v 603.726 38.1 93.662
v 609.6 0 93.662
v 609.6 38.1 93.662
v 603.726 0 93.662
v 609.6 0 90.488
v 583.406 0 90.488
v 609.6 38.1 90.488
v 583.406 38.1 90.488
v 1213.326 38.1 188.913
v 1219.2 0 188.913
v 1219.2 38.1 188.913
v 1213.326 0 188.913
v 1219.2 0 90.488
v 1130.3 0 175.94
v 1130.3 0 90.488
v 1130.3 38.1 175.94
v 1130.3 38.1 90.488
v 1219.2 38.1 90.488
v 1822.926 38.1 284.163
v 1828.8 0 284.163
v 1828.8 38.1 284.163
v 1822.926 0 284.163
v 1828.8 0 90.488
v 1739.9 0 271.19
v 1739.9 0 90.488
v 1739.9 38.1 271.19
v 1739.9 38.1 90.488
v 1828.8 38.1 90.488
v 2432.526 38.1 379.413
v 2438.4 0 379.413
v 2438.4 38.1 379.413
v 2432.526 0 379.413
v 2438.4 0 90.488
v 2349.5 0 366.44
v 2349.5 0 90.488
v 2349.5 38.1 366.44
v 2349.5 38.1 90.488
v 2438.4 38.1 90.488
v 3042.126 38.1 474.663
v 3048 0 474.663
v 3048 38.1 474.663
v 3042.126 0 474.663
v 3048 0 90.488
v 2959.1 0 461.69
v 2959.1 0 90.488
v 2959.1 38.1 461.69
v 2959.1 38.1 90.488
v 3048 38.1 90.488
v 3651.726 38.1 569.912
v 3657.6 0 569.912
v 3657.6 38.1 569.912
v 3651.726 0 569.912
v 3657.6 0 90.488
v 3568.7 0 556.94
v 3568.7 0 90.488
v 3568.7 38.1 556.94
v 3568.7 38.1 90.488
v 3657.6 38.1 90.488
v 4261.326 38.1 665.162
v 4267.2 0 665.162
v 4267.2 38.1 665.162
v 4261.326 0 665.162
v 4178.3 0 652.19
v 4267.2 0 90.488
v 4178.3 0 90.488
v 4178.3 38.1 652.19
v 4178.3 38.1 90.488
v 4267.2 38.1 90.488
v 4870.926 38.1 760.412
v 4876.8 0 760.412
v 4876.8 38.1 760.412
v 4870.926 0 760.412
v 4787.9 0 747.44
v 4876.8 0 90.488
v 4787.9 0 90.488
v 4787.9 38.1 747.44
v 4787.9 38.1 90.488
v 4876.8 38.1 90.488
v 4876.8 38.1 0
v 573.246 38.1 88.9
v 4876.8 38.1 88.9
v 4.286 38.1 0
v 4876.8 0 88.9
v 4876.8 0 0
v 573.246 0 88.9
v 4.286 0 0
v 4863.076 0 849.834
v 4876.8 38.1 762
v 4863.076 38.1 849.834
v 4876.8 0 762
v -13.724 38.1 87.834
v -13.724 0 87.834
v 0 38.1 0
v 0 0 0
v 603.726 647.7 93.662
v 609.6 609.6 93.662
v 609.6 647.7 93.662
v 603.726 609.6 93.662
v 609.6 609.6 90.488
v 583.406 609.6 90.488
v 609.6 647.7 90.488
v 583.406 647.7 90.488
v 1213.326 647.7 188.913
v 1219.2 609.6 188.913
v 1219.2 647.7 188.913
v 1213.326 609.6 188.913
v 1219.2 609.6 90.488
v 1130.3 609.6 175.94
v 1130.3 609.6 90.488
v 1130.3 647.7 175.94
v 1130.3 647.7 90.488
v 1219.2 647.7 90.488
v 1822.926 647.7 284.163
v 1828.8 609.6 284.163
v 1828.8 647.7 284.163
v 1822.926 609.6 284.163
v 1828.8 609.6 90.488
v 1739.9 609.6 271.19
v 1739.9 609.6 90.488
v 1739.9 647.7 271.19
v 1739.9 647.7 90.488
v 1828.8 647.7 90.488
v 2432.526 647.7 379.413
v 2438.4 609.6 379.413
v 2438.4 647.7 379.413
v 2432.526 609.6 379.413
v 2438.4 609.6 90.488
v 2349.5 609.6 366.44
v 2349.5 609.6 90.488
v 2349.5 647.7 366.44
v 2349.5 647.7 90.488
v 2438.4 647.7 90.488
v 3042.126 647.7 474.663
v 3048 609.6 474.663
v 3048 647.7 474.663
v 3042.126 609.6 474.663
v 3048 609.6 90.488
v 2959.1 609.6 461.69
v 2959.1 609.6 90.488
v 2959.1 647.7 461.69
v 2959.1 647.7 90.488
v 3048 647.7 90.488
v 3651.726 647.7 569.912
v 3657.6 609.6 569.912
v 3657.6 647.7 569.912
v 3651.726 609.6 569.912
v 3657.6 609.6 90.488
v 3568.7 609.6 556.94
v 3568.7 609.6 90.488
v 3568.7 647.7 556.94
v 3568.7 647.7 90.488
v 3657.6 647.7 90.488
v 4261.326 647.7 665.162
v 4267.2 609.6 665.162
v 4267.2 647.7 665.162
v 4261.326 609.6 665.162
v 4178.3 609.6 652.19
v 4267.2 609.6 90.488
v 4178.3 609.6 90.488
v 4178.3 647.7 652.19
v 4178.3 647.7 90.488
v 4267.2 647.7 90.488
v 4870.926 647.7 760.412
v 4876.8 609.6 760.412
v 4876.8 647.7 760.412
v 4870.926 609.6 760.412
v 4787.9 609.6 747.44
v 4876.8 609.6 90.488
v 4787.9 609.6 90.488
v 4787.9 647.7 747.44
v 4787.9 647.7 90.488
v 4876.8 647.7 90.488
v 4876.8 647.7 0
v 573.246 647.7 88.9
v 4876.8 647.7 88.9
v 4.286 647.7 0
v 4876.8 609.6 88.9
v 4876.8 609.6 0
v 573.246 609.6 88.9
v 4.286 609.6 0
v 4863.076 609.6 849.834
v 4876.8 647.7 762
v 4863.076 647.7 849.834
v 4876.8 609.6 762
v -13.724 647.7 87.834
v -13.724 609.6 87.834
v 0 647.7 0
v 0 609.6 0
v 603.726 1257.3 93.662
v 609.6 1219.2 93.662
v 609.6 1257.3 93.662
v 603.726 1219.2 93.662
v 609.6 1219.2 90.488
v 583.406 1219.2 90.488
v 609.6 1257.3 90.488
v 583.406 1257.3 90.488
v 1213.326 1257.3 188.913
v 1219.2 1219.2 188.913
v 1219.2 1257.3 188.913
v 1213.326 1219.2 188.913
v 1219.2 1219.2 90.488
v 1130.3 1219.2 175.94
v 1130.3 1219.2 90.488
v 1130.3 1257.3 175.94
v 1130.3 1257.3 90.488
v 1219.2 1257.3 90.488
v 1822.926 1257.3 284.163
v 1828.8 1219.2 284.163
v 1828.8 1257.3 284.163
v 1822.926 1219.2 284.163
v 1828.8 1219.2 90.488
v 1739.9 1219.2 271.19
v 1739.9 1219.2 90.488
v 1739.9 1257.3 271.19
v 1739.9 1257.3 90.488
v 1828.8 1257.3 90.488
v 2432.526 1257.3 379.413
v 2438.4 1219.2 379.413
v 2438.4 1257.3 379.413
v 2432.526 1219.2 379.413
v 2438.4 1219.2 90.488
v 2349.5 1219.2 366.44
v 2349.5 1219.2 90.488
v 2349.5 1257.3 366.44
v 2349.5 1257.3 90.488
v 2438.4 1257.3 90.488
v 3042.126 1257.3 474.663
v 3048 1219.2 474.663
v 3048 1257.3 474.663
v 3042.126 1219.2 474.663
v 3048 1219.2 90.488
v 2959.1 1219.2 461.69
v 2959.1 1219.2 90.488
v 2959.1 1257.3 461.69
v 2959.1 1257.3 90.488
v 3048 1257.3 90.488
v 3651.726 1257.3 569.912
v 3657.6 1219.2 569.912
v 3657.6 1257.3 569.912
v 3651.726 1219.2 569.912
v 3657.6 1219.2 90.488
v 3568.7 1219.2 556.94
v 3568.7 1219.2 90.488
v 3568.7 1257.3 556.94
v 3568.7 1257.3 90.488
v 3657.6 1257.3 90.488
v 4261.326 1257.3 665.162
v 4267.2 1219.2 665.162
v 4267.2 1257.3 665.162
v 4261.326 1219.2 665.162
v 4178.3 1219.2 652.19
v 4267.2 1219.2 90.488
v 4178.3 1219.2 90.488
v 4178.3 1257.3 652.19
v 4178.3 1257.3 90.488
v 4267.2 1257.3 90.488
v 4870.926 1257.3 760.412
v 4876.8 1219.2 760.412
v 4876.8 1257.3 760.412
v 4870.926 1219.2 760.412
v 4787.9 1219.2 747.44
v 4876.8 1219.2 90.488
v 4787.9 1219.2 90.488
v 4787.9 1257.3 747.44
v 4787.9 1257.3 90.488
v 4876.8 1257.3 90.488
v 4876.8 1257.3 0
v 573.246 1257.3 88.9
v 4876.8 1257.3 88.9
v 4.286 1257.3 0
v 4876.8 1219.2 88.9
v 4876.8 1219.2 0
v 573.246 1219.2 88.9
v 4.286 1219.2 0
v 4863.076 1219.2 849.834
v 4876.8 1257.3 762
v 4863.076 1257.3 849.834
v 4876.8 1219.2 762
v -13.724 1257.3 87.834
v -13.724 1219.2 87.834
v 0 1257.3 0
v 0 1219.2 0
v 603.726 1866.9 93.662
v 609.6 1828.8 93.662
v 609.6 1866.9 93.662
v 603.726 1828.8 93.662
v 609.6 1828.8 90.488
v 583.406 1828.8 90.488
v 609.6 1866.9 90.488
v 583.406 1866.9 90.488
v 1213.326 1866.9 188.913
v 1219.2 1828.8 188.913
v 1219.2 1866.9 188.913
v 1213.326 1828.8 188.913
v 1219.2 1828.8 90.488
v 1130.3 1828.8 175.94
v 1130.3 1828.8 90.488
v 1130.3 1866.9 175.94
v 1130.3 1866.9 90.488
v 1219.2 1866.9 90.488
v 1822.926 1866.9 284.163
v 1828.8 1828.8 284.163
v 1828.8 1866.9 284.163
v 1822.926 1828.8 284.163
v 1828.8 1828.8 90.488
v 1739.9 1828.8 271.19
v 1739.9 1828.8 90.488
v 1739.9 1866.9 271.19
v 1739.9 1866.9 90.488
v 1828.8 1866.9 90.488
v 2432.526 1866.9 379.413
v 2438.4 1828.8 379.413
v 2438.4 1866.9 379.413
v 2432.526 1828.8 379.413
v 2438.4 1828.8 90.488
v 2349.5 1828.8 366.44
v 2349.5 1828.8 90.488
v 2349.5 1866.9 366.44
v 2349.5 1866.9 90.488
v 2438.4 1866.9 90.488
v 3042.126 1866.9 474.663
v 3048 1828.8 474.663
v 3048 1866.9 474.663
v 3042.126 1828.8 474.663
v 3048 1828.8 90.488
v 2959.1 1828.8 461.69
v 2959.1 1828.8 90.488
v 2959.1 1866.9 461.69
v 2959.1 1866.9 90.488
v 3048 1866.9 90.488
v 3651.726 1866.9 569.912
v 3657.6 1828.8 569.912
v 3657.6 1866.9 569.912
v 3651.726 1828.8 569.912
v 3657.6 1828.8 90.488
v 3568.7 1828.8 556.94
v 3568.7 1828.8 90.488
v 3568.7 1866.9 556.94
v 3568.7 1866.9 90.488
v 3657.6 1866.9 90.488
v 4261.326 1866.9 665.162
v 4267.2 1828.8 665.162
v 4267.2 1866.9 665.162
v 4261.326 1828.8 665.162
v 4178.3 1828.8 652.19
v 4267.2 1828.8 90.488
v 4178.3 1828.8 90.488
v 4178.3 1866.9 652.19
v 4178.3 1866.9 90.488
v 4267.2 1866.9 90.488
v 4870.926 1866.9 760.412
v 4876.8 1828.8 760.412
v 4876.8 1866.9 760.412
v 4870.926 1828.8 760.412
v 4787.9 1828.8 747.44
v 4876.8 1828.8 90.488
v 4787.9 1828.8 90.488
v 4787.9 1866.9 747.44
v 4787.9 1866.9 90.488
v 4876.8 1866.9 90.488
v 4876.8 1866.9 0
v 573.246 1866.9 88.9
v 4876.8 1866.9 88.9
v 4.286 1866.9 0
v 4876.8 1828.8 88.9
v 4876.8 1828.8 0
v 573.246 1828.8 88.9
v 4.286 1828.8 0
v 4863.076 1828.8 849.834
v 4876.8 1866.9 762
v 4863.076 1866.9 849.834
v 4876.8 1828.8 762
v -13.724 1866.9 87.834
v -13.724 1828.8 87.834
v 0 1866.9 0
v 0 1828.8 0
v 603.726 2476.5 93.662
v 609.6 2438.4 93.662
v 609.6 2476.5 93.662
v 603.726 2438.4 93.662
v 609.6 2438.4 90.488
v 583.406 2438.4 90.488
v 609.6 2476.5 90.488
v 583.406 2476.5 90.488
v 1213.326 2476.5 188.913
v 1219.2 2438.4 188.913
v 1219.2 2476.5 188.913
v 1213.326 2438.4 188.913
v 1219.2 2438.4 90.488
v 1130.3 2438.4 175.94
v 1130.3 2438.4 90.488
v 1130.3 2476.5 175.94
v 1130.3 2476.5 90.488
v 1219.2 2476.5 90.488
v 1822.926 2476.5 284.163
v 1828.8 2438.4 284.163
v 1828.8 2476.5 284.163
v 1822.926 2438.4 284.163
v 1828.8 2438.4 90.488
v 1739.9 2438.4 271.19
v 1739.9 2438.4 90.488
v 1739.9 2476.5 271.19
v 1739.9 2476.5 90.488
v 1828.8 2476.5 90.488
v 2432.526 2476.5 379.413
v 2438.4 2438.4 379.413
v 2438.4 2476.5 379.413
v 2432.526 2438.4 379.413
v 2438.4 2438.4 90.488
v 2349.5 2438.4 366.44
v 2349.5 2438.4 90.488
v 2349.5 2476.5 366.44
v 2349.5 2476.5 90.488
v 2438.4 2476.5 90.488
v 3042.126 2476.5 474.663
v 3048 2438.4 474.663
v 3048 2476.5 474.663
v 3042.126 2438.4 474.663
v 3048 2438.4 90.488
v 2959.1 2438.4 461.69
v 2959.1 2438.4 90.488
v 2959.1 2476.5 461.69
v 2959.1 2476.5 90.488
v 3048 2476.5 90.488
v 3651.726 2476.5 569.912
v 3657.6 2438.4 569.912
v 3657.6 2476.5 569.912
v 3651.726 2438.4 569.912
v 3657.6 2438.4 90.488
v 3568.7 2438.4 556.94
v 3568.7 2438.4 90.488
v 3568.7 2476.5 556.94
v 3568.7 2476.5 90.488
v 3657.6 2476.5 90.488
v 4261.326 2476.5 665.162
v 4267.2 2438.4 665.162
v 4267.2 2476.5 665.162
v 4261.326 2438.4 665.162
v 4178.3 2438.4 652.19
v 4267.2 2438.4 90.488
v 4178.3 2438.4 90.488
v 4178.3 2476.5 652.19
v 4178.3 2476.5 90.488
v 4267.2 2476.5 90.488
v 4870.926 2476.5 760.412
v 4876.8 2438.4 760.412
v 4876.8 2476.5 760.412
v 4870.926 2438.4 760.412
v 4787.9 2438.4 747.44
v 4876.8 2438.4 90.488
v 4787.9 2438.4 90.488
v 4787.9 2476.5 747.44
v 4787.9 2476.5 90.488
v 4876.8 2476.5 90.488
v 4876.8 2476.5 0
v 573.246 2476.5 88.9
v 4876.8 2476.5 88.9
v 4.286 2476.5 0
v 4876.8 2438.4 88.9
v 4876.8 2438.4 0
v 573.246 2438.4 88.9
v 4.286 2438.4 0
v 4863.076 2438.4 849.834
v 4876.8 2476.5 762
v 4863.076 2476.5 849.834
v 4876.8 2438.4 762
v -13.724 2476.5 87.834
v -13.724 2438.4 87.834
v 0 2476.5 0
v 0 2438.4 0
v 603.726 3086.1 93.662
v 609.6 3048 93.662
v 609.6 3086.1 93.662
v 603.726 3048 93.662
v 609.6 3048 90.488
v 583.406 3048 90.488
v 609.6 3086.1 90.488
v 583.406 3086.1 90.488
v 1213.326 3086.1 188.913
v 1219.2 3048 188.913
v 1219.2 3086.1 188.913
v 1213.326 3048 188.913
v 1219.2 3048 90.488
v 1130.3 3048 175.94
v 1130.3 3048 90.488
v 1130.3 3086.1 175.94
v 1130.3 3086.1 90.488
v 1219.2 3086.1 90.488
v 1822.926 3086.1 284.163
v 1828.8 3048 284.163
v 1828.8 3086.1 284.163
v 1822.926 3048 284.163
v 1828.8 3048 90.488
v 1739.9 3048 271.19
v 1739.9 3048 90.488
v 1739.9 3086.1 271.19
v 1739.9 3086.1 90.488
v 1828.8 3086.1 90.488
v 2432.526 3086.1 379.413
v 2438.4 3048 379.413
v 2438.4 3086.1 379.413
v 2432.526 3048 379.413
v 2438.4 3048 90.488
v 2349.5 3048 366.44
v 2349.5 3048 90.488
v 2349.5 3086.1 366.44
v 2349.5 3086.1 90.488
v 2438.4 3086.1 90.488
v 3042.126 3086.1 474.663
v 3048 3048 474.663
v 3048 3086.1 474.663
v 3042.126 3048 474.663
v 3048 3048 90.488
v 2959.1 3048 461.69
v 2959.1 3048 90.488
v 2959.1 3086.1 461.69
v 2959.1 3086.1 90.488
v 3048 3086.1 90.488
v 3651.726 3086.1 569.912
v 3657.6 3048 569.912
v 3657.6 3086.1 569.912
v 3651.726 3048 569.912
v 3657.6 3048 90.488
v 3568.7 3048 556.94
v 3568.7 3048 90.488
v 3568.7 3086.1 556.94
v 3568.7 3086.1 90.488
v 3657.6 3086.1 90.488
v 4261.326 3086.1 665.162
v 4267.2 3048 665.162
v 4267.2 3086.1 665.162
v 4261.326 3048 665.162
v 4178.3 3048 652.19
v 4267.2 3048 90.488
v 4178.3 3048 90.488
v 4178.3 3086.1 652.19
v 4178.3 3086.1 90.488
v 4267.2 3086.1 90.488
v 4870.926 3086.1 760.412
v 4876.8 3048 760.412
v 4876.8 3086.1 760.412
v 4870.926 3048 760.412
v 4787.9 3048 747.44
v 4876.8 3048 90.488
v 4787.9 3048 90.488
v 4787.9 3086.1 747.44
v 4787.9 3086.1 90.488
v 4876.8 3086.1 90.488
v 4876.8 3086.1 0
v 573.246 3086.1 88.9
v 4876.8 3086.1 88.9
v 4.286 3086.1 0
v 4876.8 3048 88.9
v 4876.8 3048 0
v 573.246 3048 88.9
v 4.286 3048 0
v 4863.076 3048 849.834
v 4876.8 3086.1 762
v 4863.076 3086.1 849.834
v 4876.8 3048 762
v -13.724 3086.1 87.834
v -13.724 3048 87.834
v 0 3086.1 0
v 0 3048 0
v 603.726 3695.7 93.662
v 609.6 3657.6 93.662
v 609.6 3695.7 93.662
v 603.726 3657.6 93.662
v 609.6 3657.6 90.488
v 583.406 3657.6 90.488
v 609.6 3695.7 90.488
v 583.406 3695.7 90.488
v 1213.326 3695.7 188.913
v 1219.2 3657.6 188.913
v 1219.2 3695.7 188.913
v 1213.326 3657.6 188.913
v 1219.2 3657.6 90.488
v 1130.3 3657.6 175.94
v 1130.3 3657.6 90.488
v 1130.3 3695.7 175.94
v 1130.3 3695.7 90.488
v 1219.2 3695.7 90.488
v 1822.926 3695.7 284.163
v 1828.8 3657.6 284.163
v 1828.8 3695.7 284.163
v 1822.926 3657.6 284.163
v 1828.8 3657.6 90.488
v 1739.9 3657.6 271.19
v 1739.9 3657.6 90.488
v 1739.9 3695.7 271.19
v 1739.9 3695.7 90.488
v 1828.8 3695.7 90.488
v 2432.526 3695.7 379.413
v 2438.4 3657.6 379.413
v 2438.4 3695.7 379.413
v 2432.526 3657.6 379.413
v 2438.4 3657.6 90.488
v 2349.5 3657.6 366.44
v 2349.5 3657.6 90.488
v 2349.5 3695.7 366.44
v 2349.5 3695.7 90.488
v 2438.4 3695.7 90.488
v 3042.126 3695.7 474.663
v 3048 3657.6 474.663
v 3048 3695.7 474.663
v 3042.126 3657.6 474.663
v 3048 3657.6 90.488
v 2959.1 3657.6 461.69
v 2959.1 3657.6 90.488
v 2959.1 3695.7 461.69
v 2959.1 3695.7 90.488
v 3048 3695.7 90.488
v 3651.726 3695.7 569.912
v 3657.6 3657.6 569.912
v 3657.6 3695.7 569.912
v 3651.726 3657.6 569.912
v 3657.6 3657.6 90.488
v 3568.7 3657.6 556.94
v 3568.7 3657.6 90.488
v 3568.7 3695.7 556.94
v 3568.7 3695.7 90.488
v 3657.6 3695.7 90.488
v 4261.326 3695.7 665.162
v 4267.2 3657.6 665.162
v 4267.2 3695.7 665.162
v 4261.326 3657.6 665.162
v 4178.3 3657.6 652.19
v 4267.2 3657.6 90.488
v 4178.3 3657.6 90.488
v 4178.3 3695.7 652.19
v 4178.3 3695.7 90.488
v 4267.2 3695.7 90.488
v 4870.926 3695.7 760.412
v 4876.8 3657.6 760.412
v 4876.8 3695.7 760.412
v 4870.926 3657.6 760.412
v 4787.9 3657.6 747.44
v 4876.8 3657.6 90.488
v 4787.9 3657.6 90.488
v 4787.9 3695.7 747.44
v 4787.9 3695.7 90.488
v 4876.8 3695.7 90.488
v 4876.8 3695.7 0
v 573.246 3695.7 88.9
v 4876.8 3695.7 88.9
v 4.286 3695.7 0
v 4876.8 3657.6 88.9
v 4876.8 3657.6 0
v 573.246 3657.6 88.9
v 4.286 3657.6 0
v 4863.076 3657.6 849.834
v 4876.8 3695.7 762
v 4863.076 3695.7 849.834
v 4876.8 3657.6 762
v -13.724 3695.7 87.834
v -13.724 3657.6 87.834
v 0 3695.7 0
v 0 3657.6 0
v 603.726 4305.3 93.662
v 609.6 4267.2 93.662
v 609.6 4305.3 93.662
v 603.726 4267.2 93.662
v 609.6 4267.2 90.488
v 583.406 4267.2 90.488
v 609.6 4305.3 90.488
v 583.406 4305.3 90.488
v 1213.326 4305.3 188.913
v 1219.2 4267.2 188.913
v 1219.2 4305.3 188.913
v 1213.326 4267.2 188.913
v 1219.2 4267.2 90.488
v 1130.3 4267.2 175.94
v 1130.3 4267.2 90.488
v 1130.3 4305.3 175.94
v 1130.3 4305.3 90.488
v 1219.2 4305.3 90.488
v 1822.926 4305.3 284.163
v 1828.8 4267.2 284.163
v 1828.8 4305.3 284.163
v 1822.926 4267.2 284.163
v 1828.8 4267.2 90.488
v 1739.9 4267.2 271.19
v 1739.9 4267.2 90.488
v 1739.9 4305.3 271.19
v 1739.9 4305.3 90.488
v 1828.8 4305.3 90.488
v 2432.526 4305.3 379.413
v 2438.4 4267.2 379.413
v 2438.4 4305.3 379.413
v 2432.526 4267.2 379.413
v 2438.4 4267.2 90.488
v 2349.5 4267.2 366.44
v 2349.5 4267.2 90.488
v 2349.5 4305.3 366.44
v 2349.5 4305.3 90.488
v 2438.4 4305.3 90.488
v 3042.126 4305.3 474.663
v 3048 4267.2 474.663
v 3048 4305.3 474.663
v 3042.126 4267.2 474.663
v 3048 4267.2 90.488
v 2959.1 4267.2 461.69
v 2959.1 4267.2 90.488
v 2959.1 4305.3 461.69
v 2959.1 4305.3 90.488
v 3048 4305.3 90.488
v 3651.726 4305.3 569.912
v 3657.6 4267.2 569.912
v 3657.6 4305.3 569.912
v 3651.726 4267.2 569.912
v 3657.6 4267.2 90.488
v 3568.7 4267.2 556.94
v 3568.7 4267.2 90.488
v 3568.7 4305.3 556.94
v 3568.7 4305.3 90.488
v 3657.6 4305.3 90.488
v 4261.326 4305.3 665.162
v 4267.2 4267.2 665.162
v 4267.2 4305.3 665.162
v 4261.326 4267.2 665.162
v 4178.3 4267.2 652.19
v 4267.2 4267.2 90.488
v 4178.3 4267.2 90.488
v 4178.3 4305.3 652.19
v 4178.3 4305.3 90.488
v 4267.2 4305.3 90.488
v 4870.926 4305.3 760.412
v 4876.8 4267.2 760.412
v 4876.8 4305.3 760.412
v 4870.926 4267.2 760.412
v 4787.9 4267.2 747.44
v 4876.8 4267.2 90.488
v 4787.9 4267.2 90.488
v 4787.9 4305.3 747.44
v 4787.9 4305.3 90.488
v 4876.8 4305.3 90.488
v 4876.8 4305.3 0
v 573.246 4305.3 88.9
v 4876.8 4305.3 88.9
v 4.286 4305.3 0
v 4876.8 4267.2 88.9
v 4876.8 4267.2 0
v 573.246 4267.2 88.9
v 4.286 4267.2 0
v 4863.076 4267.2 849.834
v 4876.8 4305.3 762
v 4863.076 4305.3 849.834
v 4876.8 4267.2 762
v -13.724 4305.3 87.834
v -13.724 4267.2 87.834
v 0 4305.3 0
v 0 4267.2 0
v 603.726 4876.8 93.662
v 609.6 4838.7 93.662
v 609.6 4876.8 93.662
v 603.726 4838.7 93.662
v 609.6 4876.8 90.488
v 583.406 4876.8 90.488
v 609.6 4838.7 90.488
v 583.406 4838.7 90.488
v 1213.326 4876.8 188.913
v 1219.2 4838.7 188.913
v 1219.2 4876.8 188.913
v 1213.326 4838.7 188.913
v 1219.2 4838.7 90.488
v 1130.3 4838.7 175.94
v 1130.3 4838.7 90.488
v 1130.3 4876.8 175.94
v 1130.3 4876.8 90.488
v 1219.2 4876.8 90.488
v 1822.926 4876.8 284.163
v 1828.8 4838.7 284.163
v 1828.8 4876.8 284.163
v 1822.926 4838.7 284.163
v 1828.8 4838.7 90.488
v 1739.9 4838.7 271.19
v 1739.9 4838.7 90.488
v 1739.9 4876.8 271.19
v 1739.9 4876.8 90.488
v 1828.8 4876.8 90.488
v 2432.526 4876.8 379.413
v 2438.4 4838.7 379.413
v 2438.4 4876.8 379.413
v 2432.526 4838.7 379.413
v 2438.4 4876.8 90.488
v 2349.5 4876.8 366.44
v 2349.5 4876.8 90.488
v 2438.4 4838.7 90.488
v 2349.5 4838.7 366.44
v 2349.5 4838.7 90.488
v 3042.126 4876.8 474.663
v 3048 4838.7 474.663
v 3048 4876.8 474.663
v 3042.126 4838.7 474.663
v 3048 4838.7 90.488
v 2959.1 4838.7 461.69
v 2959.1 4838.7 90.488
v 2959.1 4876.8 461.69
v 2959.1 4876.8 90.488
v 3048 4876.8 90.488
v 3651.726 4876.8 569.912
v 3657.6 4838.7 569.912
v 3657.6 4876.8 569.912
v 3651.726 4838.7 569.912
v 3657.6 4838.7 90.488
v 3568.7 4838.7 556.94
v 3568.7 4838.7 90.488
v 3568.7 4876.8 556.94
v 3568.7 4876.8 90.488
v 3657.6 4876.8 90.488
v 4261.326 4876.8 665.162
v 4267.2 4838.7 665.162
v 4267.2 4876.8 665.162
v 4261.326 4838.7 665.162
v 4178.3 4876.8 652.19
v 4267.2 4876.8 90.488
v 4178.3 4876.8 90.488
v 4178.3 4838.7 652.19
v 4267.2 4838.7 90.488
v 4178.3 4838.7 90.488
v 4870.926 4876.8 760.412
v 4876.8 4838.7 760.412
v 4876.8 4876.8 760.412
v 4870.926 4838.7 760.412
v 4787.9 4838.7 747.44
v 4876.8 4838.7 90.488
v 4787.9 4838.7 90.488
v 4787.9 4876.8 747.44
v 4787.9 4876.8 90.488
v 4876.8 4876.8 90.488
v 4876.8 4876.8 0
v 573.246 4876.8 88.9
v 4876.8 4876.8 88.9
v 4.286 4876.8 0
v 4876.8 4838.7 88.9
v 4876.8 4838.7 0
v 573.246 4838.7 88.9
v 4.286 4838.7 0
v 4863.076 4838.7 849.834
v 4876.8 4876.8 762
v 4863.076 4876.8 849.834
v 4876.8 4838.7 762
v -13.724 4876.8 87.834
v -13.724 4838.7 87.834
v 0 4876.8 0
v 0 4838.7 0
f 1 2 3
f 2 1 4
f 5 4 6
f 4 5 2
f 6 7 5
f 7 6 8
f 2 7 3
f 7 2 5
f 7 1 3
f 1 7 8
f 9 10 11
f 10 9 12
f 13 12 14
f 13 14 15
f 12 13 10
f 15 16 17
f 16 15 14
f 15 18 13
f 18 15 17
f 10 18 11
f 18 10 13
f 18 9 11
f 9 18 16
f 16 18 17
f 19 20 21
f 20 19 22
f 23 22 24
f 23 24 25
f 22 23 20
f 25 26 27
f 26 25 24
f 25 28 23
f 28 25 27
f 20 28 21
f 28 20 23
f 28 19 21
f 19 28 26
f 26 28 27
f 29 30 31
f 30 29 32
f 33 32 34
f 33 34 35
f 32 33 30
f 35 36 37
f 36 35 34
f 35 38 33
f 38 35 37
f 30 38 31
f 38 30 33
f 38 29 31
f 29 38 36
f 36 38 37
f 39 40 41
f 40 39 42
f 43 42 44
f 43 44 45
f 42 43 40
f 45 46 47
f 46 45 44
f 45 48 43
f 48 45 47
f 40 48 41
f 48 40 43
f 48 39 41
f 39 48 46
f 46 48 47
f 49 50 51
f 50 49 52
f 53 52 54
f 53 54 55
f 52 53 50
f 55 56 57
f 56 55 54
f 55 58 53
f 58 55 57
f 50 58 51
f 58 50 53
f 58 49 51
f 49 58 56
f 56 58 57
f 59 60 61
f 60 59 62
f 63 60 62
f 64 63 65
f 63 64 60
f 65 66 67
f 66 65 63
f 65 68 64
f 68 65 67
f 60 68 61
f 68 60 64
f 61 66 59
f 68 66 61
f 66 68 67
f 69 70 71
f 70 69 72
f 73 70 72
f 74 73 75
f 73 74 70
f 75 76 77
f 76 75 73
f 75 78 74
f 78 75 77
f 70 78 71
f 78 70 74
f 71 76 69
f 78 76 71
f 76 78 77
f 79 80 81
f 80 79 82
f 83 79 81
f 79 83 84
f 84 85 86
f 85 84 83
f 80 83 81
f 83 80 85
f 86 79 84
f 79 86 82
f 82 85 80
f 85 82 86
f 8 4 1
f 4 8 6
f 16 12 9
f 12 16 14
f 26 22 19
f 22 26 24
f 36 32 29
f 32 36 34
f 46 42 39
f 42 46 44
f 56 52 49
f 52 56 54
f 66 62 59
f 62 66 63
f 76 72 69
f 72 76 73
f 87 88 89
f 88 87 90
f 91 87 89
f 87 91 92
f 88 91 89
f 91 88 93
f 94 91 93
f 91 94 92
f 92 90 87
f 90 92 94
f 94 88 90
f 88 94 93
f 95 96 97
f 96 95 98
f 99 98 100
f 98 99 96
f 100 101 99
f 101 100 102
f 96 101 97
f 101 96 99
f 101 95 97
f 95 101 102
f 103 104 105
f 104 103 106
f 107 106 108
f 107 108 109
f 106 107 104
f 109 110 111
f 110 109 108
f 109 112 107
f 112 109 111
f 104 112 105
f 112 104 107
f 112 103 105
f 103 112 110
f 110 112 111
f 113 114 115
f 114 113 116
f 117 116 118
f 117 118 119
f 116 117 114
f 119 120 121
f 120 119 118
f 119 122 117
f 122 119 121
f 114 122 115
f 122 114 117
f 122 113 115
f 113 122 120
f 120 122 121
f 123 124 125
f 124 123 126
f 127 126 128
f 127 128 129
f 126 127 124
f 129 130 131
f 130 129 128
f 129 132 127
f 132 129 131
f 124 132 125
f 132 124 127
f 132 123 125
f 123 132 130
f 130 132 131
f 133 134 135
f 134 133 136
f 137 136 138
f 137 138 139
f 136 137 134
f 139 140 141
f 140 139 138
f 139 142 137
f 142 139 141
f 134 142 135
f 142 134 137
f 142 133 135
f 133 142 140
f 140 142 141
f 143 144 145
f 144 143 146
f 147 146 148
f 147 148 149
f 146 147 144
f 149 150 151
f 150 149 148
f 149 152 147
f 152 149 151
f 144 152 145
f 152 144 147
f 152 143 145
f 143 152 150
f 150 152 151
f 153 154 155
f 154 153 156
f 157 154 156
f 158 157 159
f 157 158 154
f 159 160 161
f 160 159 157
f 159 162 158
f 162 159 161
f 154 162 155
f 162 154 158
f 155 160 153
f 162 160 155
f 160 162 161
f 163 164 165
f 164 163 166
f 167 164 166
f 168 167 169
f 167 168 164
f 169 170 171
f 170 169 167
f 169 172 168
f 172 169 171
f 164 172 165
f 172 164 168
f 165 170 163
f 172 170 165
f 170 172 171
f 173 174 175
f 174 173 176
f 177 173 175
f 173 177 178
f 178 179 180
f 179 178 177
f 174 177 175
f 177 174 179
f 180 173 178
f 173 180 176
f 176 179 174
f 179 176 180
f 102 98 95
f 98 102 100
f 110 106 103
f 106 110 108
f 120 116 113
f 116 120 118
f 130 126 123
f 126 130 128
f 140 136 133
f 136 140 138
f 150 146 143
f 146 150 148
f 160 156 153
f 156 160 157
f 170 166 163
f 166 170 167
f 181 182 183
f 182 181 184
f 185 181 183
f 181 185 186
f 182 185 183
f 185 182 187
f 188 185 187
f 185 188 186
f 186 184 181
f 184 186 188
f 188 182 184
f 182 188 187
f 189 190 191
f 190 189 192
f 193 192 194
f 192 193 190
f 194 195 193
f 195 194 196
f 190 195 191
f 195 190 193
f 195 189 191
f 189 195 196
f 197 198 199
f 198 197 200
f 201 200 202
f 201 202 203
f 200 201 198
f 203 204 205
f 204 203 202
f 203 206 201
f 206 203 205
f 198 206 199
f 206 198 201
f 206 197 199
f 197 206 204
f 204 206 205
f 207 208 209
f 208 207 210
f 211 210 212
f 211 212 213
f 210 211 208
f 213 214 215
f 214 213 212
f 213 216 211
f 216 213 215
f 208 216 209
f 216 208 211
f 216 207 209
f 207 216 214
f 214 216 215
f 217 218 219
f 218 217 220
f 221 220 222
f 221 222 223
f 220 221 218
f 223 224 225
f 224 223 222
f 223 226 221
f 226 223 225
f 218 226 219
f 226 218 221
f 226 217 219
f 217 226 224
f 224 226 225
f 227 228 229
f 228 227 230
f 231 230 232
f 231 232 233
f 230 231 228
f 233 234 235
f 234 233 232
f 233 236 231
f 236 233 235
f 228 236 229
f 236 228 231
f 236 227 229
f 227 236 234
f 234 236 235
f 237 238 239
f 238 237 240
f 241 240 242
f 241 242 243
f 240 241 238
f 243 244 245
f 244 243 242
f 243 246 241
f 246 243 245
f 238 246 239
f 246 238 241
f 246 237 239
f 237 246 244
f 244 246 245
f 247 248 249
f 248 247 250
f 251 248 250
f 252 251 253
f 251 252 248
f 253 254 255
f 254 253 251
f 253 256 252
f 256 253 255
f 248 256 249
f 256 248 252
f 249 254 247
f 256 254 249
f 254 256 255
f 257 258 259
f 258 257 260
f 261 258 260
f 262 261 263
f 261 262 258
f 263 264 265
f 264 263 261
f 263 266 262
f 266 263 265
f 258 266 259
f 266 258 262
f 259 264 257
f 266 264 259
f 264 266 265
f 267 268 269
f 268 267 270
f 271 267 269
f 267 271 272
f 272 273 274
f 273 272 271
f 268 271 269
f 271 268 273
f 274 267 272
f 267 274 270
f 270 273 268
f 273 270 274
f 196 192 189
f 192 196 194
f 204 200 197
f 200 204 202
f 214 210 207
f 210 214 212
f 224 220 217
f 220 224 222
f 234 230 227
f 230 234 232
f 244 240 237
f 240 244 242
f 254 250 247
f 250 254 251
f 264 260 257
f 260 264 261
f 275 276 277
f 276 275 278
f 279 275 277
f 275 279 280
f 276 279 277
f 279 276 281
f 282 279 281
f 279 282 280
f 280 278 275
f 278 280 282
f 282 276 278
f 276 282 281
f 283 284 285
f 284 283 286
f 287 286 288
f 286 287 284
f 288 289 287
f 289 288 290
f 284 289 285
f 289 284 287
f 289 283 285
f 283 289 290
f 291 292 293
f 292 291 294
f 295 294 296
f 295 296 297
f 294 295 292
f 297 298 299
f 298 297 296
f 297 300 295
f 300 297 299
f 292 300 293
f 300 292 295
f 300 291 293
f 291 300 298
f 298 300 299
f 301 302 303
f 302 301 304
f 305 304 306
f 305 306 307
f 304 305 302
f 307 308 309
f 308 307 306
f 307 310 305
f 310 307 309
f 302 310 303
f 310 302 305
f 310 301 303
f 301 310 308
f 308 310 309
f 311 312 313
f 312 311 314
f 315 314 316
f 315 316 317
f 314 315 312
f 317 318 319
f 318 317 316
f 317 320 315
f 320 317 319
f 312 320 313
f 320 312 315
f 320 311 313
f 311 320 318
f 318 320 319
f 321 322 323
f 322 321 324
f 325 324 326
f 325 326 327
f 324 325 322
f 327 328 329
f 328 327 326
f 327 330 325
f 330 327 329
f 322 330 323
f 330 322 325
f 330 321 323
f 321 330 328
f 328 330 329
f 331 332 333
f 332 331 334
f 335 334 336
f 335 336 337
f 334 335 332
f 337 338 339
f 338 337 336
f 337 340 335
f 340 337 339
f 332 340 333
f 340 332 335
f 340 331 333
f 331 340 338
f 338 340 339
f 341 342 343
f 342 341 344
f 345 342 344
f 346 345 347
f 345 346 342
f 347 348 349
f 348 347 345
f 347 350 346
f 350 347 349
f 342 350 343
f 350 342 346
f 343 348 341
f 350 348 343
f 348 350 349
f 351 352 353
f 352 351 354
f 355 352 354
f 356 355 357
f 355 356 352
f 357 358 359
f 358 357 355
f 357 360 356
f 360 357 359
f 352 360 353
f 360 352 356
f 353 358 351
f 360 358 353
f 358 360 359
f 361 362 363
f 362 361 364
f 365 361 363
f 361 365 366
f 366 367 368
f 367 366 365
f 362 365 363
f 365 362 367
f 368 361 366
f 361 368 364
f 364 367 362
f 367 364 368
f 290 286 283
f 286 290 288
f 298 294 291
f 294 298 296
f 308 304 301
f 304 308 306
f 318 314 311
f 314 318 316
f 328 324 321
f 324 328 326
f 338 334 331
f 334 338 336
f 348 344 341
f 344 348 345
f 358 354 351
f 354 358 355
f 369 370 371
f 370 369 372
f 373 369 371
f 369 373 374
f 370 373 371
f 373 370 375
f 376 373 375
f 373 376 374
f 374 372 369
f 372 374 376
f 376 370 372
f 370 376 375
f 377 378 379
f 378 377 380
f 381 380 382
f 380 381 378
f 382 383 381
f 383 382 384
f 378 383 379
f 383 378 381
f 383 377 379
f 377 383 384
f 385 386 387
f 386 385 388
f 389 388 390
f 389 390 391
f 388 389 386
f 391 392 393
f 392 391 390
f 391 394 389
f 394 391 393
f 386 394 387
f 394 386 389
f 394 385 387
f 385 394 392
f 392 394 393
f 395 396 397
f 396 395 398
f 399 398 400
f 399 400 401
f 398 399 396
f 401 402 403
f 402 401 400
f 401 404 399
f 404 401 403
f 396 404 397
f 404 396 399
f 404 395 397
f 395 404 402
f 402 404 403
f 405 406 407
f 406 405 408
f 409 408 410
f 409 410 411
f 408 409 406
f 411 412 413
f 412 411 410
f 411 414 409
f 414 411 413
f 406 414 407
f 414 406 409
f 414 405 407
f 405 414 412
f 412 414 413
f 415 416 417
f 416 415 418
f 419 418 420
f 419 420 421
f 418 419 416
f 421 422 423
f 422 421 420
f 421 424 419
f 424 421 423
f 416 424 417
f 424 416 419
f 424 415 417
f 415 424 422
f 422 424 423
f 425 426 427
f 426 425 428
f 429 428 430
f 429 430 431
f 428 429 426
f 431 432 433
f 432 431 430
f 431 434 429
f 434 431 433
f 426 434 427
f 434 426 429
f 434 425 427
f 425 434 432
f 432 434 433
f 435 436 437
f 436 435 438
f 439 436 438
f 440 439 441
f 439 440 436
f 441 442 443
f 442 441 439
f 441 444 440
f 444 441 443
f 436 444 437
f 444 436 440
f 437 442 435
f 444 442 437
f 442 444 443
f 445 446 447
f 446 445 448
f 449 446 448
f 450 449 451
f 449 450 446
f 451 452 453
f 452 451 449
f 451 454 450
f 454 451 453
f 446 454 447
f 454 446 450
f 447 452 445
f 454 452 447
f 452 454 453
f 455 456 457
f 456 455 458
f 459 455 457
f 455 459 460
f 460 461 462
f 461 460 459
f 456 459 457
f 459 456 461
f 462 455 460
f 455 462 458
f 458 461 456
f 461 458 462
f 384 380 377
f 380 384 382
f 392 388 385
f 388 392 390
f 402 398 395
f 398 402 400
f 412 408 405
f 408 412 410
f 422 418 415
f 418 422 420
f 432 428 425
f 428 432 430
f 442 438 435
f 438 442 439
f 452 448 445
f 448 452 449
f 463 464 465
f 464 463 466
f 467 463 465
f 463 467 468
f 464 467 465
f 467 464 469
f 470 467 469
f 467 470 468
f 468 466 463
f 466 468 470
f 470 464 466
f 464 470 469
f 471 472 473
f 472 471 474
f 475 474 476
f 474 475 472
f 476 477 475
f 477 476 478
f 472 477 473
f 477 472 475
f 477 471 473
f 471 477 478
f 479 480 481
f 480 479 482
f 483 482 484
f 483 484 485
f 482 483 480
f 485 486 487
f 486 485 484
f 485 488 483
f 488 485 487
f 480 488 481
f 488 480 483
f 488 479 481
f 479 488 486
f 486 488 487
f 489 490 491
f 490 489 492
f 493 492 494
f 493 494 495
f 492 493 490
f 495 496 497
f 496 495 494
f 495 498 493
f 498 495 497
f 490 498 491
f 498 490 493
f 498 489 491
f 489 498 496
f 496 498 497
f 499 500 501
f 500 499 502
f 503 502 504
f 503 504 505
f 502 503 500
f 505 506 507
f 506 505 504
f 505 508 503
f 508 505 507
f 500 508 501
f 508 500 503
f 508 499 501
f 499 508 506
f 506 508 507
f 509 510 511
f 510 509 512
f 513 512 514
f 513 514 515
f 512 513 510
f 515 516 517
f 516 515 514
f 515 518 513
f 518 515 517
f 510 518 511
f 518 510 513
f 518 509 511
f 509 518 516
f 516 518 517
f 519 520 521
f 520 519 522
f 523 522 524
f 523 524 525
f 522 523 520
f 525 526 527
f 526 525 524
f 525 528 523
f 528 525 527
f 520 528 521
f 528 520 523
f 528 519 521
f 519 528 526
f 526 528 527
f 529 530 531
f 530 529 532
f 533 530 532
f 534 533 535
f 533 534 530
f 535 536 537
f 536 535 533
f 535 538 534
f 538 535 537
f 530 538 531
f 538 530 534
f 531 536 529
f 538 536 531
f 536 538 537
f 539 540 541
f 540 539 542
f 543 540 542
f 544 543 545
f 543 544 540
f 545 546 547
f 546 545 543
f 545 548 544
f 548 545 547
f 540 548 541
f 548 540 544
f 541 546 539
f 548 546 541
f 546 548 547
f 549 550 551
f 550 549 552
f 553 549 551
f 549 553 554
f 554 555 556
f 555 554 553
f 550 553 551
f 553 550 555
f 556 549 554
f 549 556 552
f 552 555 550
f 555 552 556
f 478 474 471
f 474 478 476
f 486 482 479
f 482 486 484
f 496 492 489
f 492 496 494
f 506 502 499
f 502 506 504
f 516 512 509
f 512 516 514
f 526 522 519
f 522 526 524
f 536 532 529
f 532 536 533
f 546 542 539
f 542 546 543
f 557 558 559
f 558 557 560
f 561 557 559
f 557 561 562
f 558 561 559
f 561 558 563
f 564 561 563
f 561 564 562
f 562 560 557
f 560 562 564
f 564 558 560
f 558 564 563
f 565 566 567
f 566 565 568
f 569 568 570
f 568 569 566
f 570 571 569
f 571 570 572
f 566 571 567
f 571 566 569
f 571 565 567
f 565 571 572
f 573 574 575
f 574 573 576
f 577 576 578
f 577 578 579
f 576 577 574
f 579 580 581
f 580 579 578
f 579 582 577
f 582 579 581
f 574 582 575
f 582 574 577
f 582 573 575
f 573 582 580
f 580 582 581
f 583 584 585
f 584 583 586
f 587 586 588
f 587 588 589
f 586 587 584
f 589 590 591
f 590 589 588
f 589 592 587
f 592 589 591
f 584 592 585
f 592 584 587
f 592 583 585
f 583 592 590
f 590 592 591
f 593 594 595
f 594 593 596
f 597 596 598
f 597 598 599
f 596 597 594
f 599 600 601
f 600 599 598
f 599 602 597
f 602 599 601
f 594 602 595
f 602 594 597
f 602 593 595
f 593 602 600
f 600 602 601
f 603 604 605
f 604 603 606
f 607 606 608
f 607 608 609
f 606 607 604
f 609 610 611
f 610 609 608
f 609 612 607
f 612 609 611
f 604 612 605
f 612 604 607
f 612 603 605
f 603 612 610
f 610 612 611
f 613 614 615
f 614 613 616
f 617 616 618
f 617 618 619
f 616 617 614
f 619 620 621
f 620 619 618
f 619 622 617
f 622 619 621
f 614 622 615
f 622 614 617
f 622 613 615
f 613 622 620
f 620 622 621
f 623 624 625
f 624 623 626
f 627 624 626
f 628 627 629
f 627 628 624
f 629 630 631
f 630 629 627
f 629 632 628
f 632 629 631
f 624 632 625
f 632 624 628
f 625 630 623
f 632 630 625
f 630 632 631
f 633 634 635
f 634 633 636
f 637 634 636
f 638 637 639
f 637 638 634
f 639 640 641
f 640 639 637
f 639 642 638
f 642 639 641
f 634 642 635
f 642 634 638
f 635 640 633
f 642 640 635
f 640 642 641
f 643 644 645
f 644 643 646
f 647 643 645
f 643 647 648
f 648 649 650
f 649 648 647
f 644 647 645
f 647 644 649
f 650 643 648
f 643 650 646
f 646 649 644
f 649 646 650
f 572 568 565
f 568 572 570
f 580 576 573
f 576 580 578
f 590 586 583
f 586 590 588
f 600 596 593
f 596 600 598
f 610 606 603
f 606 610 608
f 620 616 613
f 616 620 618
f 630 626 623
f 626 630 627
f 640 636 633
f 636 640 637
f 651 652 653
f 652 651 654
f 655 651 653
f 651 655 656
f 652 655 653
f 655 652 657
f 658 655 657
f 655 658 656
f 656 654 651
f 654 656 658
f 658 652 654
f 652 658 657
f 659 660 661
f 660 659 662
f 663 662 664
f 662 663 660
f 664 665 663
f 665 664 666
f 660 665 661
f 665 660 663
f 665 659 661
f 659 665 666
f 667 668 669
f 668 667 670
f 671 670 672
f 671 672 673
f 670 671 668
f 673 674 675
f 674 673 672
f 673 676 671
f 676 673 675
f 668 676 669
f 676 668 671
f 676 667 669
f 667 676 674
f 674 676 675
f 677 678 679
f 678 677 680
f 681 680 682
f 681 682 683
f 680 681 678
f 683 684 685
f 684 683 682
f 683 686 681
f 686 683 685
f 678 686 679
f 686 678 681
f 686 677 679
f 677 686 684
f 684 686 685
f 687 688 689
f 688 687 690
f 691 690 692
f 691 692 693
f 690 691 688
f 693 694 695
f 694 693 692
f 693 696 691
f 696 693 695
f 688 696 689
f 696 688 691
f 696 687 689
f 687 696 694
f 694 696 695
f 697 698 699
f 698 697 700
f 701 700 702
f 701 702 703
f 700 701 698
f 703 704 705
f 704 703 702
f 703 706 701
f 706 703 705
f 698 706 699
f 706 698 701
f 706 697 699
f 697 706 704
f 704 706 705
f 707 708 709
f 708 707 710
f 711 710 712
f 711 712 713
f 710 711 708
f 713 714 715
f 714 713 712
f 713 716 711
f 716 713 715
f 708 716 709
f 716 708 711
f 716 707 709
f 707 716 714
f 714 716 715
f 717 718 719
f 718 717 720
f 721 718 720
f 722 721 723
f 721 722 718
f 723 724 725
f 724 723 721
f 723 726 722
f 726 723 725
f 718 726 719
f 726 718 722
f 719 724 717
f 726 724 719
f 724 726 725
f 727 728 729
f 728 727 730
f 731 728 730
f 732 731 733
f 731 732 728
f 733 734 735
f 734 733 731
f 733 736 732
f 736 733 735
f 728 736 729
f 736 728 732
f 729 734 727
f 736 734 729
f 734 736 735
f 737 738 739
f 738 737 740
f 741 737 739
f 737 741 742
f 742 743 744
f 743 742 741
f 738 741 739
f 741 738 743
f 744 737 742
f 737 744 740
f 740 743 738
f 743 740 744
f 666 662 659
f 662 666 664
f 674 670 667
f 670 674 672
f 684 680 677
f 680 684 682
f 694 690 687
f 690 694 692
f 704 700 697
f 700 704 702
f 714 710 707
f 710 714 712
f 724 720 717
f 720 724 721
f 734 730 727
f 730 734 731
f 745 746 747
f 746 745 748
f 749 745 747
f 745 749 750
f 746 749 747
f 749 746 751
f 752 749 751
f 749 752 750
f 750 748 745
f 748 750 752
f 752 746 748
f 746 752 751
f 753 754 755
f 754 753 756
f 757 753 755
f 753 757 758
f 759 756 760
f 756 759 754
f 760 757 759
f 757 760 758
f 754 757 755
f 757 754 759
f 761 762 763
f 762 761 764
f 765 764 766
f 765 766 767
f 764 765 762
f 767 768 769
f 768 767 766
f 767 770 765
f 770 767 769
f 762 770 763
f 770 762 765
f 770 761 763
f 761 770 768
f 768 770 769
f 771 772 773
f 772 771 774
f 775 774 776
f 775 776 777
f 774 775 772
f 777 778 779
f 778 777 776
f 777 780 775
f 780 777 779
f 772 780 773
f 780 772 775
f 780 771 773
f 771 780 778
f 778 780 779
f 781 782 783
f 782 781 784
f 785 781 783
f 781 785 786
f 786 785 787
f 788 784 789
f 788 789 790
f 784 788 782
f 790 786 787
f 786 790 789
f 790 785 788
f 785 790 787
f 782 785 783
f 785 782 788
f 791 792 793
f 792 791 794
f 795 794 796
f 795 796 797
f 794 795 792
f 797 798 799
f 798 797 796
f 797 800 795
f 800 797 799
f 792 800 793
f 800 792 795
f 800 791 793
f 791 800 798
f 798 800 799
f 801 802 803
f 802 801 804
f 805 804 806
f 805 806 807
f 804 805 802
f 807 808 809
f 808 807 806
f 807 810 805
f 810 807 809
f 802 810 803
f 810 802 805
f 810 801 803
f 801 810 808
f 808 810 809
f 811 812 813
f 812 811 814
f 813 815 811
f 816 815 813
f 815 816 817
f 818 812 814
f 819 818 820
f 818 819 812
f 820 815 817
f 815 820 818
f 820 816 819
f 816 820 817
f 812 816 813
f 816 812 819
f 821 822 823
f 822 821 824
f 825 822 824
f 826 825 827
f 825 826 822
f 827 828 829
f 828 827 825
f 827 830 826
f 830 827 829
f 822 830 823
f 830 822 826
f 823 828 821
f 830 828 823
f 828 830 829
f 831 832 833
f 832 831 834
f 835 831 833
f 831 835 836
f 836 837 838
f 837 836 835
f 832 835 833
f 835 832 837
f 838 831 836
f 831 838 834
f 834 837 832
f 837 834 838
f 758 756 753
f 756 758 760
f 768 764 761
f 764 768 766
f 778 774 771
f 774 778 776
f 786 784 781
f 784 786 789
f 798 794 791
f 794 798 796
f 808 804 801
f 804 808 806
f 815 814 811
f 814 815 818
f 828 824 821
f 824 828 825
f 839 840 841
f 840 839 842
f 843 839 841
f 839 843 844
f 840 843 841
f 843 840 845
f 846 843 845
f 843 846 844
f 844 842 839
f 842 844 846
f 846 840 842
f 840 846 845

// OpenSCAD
// https://www.mycarpentry.com/rafter-span-tables.html

// Dimensions of the requested roof (W x H x D)
Roof_Dimensions = [192, 30, 192];

// Dimensions of the rafters to use (W X H x L)
Rafter_Dimensions = [1.5, 3.5, 192];

// On center rafter spacing
Rafter_Spacing = 24;

// Object spacing to avoid merging on export
Object_Spacing = 0.0625;

// Scale factor useful when importing to other software (ex. 25.4 for inches);
Scale_Factor = 25.4;

module rafter(i, angle, length, rafter_dimensions, e = 0) {
    translate([-(e / 2), i - (e / 2), - (e/2)])
    rotate([0, 90 - angle, 0])
    rotate([0, 0, 90])
    cube([rafter_dimensions[0] + e, rafter_dimensions[1] + e, length + e]);
}

module truss(i, angle, length, roof_dimensions, rafter_dimensions, rafter_spacing, object_spacing) {
    rafter(i, angle, length, rafter_dimensions);
    difference() {
            union() {
                // span
                translate([0, rafter_dimensions[0] + i - rafter_dimensions[0], 0])
                rotate([0, 90, 0])
                rotate([0, 0, 90])
                cube([rafter_dimensions[0], rafter_dimensions[1], roof_dimensions[0]]);

                for (ii = [rafter_spacing:rafter_spacing:roof_dimensions[0]]) {
                    // riser
                    translate([ii, rafter_dimensions[0] + i - rafter_dimensions[0], rafter_dimensions[1] + object_spacing])
                    rotate([0, 0, 90])
                    cube([rafter_dimensions[0], rafter_dimensions[1], (tan(angle) * ii) - rafter_dimensions[1] - (object_spacing * 2)]);
                }
            }

            rafter(i, angle, length, rafter_dimensions, object_spacing);
        }
}

module roof(roof_dimensions, rafter_dimensions = [1.5, 3.5, 192], rafter_spacing = 24, object_spacing = 0.0625, scale_factor = 25.4) {
    angle = atan(roof_dimensions[1] / roof_dimensions[0]);
    rafter_length = sqrt(pow(roof_dimensions[0], 2) + pow(roof_dimensions[1], 2));

    // first truss
    truss(0, angle, rafter_length, roof_dimensions, rafter_dimensions, rafter_spacing, object_spacing);

    for (i = [rafter_spacing:rafter_spacing:roof_dimensions[2] - rafter_spacing]) {
        truss(i, angle, rafter_length, roof_dimensions, rafter_dimensions, rafter_spacing, object_spacing);
    }

    // last truss
    truss(roof_dimensions[2] - rafter_dimensions[0], angle, rafter_length, roof_dimensions, rafter_dimensions, rafter_spacing, object_spacing);

    // TODO: furring strips (1x2x96) on top of rafters
};

scale([Scale_Factor, Scale_Factor, Scale_Factor])
roof(Roof_Dimensions, Rafter_Dimensions, Rafter_Spacing, Object_Spacing, Scale_Factor);
